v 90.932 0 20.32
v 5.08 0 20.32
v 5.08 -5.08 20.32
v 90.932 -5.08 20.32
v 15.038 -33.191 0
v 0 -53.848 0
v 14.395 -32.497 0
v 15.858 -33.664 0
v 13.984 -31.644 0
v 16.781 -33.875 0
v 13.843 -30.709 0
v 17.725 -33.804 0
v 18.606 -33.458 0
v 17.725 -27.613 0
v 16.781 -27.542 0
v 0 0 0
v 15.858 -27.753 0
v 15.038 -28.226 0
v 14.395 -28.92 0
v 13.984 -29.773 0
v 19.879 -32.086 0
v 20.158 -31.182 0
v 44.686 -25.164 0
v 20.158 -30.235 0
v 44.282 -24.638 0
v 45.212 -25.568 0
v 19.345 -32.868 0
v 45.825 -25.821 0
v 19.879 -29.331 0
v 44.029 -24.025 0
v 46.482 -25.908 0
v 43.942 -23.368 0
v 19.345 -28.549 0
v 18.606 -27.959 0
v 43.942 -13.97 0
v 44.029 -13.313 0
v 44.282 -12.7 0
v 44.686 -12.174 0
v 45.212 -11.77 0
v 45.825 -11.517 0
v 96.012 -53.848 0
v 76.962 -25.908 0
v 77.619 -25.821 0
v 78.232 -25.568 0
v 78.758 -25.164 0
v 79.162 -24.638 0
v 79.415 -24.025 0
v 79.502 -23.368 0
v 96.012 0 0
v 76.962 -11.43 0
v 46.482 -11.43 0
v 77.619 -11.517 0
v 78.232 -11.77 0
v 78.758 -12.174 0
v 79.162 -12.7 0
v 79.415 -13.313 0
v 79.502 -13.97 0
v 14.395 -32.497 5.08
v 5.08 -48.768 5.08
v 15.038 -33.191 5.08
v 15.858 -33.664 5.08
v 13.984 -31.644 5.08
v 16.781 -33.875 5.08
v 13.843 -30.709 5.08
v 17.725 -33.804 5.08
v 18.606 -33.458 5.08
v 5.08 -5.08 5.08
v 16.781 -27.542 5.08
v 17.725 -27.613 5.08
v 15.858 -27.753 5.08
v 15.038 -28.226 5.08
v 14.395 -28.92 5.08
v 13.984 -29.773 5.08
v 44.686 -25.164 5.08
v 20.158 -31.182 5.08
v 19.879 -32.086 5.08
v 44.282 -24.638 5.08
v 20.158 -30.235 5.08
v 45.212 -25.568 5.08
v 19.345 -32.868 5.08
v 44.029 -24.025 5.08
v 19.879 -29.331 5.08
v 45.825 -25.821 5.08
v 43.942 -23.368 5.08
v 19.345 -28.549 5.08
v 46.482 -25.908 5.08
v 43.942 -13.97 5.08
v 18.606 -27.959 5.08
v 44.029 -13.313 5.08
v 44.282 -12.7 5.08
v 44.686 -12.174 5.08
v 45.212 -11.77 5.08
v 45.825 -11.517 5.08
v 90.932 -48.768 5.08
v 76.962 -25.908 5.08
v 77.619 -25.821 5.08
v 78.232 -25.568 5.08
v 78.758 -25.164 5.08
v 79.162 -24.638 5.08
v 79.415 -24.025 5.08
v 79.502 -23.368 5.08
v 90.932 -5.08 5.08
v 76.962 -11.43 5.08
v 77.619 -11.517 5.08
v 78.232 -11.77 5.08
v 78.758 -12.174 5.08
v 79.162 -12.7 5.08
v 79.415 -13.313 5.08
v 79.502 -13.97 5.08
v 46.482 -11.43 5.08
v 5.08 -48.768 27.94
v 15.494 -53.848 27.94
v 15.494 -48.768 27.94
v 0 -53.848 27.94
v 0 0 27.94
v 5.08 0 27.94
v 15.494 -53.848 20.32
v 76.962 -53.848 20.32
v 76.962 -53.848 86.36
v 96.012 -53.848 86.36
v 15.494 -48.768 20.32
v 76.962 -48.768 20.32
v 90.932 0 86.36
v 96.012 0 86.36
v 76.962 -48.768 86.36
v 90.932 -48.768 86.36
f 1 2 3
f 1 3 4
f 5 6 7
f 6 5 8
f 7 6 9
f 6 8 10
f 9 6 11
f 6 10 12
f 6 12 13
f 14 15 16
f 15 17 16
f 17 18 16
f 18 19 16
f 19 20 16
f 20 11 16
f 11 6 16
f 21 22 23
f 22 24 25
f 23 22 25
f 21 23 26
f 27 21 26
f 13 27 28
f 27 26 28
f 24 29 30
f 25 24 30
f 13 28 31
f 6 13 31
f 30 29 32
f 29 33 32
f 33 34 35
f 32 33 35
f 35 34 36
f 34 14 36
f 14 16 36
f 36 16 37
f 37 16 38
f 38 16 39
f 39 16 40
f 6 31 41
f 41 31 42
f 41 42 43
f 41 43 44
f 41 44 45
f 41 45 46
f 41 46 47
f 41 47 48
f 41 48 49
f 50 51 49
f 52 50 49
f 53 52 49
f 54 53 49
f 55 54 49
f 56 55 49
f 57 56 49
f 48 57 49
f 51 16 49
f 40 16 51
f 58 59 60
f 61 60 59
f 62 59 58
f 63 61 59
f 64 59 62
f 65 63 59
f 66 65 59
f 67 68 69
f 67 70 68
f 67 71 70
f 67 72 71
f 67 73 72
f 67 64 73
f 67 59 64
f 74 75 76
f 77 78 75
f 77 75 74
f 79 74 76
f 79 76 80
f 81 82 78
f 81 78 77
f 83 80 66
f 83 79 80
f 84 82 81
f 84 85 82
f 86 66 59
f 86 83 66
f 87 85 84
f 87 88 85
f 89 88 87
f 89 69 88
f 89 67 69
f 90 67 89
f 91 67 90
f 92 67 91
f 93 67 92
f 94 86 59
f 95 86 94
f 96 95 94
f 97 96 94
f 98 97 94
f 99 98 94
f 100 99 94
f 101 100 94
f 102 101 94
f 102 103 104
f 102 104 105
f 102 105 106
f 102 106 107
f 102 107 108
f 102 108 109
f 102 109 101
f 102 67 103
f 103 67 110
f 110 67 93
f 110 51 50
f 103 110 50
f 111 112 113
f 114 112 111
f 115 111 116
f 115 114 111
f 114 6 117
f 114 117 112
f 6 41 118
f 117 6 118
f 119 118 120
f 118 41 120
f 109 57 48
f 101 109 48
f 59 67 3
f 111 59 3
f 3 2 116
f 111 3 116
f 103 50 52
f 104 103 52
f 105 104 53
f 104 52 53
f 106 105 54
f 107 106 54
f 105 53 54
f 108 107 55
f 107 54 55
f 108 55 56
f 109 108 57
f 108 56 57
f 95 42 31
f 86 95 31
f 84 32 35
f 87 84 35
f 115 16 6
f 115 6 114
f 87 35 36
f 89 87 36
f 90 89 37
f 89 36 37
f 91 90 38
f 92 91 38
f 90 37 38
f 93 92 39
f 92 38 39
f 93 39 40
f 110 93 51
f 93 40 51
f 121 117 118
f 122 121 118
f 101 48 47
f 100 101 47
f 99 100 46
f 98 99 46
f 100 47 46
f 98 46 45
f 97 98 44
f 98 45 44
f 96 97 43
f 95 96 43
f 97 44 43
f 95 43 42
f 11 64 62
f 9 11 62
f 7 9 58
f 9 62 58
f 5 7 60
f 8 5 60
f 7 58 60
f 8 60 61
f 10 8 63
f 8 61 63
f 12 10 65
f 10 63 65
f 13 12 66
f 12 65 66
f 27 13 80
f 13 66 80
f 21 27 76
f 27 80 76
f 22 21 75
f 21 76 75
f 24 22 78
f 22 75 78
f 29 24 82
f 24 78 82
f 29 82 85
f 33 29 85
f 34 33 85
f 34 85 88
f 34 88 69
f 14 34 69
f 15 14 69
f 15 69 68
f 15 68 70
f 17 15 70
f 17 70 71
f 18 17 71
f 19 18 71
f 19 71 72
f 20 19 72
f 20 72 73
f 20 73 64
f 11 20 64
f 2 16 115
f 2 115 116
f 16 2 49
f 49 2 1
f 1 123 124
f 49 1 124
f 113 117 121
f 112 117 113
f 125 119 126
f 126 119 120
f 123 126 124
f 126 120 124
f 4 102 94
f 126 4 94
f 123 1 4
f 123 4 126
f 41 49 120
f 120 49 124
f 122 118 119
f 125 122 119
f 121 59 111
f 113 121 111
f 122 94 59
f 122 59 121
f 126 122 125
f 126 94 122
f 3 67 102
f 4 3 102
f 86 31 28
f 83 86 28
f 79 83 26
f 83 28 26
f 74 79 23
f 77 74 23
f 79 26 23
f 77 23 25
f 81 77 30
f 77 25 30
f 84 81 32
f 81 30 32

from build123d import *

# Parameters (mm, degrees)
F0_W      = 96.012
F0_H      = 86.36
F1_DEPTH  = 53.848
F2_T      = -5.08
F4_D      = 6.35
F6_DEPTH  = 25.4
F7_W      = 84.328
F7_H      = 66.04
F8_DEPTH  = 25.4
F9_W      = 53.848
F9_H      = 58.42
F10_DEPTH = 25.4
F11_W     = 85.852
F11_H     = 5.08
F12_DEPTH = 15.24
F13_DEPTH = 10.16
F14_DEPTH = 12.7


# Not quite as in the source:
# - a feature names something its author has since deleted; it is built from what else it names


with BuildPart() as f1:
    # F0 (on Front) → F1 (new body)
    with BuildSketch(Plane.XZ):
        with Locations((48.006, 43.18)):
            Rectangle(F0_W, F0_H)
    extrude(amount=F1_DEPTH)

    # F2
    f2_openings = [f1.faces().sort_by_distance(p)[0] for p in [
        (48.006, -26.924, 86.36),
        (48.006, 0, 43.18),
    ]]
    offset(amount=F2_T, openings=f2_openings)

    # F4 (through all)
    with Locations(Plane(origin=(0, 0, 0), x_dir=(1, 0, 0), z_dir=(0, 0, -1))):
        with Locations((17.018, 30.7086)):
            Hole(F4_D / 2)

    # F5 (on face) → F6 (cut)
    with BuildSketch(Plane(origin=(0, 0, 0), x_dir=(1, 0, 0), z_dir=(0, 0, -1))):
        with BuildLine():
            Line((76.962, 25.908), (46.482, 25.908))
            ThreePointArc((46.482, 25.908), (44.6859487758, 25.1640512242), (43.942, 23.368))
            Line((43.942, 23.368), (43.942, 13.97))
            ThreePointArc((43.942, 13.97), (44.6859487758, 12.1739487758), (46.482, 11.43))
            Line((46.482, 11.43), (76.962, 11.43))
            ThreePointArc((76.962, 11.43), (78.7580512242, 12.1739487758), (79.502, 13.97))
            Line((79.502, 13.97), (79.502, 23.368))
            ThreePointArc((79.502, 23.368), (78.7580512242, 25.1640512242), (76.962, 25.908))
        make_face()
    extrude(amount=-F6_DEPTH, mode=Mode.SUBTRACT)

    # F7 (on face) → F8 (cut)
    with BuildSketch(Plane.XZ.offset(53.848)):
        with Locations((47.498, 53.34)):
            Rectangle(F7_W, F7_H)
    extrude(amount=-F8_DEPTH, mode=Mode.SUBTRACT)

    # F9 (on face) → F10 (cut)
    with BuildSketch(Plane(origin=(0, 0, 0), x_dir=(0, -1, 0), z_dir=(-1, 0, 0))):
        with Locations((26.924, 57.15)):
            Rectangle(F9_W, F9_H)
    extrude(amount=-F10_DEPTH, mode=Mode.SUBTRACT)

    # F11 (on face) → F12 (join)
    with BuildSketch(Plane.XY.offset(5.08)):
        with Locations((48.006, -2.54)):
            Rectangle(F11_W, F11_H)
    extrude(amount=F12_DEPTH)

    # F13 (add): a face of the model
    f13_faces = [f1.faces().sort_by_distance(p)[0] for p in [
        (5.334, -51.308, 24.13),
    ]]
    extrude(f13_faces, amount=F13_DEPTH)

    # F14 (add): a face of the model
    f14_faces = [f1.faces().sort_by_distance(p)[0] for p in [
        (89.662, -51.308, 53.34),
    ]]
    extrude(f14_faces, amount=F14_DEPTH)


solid = f1.part
